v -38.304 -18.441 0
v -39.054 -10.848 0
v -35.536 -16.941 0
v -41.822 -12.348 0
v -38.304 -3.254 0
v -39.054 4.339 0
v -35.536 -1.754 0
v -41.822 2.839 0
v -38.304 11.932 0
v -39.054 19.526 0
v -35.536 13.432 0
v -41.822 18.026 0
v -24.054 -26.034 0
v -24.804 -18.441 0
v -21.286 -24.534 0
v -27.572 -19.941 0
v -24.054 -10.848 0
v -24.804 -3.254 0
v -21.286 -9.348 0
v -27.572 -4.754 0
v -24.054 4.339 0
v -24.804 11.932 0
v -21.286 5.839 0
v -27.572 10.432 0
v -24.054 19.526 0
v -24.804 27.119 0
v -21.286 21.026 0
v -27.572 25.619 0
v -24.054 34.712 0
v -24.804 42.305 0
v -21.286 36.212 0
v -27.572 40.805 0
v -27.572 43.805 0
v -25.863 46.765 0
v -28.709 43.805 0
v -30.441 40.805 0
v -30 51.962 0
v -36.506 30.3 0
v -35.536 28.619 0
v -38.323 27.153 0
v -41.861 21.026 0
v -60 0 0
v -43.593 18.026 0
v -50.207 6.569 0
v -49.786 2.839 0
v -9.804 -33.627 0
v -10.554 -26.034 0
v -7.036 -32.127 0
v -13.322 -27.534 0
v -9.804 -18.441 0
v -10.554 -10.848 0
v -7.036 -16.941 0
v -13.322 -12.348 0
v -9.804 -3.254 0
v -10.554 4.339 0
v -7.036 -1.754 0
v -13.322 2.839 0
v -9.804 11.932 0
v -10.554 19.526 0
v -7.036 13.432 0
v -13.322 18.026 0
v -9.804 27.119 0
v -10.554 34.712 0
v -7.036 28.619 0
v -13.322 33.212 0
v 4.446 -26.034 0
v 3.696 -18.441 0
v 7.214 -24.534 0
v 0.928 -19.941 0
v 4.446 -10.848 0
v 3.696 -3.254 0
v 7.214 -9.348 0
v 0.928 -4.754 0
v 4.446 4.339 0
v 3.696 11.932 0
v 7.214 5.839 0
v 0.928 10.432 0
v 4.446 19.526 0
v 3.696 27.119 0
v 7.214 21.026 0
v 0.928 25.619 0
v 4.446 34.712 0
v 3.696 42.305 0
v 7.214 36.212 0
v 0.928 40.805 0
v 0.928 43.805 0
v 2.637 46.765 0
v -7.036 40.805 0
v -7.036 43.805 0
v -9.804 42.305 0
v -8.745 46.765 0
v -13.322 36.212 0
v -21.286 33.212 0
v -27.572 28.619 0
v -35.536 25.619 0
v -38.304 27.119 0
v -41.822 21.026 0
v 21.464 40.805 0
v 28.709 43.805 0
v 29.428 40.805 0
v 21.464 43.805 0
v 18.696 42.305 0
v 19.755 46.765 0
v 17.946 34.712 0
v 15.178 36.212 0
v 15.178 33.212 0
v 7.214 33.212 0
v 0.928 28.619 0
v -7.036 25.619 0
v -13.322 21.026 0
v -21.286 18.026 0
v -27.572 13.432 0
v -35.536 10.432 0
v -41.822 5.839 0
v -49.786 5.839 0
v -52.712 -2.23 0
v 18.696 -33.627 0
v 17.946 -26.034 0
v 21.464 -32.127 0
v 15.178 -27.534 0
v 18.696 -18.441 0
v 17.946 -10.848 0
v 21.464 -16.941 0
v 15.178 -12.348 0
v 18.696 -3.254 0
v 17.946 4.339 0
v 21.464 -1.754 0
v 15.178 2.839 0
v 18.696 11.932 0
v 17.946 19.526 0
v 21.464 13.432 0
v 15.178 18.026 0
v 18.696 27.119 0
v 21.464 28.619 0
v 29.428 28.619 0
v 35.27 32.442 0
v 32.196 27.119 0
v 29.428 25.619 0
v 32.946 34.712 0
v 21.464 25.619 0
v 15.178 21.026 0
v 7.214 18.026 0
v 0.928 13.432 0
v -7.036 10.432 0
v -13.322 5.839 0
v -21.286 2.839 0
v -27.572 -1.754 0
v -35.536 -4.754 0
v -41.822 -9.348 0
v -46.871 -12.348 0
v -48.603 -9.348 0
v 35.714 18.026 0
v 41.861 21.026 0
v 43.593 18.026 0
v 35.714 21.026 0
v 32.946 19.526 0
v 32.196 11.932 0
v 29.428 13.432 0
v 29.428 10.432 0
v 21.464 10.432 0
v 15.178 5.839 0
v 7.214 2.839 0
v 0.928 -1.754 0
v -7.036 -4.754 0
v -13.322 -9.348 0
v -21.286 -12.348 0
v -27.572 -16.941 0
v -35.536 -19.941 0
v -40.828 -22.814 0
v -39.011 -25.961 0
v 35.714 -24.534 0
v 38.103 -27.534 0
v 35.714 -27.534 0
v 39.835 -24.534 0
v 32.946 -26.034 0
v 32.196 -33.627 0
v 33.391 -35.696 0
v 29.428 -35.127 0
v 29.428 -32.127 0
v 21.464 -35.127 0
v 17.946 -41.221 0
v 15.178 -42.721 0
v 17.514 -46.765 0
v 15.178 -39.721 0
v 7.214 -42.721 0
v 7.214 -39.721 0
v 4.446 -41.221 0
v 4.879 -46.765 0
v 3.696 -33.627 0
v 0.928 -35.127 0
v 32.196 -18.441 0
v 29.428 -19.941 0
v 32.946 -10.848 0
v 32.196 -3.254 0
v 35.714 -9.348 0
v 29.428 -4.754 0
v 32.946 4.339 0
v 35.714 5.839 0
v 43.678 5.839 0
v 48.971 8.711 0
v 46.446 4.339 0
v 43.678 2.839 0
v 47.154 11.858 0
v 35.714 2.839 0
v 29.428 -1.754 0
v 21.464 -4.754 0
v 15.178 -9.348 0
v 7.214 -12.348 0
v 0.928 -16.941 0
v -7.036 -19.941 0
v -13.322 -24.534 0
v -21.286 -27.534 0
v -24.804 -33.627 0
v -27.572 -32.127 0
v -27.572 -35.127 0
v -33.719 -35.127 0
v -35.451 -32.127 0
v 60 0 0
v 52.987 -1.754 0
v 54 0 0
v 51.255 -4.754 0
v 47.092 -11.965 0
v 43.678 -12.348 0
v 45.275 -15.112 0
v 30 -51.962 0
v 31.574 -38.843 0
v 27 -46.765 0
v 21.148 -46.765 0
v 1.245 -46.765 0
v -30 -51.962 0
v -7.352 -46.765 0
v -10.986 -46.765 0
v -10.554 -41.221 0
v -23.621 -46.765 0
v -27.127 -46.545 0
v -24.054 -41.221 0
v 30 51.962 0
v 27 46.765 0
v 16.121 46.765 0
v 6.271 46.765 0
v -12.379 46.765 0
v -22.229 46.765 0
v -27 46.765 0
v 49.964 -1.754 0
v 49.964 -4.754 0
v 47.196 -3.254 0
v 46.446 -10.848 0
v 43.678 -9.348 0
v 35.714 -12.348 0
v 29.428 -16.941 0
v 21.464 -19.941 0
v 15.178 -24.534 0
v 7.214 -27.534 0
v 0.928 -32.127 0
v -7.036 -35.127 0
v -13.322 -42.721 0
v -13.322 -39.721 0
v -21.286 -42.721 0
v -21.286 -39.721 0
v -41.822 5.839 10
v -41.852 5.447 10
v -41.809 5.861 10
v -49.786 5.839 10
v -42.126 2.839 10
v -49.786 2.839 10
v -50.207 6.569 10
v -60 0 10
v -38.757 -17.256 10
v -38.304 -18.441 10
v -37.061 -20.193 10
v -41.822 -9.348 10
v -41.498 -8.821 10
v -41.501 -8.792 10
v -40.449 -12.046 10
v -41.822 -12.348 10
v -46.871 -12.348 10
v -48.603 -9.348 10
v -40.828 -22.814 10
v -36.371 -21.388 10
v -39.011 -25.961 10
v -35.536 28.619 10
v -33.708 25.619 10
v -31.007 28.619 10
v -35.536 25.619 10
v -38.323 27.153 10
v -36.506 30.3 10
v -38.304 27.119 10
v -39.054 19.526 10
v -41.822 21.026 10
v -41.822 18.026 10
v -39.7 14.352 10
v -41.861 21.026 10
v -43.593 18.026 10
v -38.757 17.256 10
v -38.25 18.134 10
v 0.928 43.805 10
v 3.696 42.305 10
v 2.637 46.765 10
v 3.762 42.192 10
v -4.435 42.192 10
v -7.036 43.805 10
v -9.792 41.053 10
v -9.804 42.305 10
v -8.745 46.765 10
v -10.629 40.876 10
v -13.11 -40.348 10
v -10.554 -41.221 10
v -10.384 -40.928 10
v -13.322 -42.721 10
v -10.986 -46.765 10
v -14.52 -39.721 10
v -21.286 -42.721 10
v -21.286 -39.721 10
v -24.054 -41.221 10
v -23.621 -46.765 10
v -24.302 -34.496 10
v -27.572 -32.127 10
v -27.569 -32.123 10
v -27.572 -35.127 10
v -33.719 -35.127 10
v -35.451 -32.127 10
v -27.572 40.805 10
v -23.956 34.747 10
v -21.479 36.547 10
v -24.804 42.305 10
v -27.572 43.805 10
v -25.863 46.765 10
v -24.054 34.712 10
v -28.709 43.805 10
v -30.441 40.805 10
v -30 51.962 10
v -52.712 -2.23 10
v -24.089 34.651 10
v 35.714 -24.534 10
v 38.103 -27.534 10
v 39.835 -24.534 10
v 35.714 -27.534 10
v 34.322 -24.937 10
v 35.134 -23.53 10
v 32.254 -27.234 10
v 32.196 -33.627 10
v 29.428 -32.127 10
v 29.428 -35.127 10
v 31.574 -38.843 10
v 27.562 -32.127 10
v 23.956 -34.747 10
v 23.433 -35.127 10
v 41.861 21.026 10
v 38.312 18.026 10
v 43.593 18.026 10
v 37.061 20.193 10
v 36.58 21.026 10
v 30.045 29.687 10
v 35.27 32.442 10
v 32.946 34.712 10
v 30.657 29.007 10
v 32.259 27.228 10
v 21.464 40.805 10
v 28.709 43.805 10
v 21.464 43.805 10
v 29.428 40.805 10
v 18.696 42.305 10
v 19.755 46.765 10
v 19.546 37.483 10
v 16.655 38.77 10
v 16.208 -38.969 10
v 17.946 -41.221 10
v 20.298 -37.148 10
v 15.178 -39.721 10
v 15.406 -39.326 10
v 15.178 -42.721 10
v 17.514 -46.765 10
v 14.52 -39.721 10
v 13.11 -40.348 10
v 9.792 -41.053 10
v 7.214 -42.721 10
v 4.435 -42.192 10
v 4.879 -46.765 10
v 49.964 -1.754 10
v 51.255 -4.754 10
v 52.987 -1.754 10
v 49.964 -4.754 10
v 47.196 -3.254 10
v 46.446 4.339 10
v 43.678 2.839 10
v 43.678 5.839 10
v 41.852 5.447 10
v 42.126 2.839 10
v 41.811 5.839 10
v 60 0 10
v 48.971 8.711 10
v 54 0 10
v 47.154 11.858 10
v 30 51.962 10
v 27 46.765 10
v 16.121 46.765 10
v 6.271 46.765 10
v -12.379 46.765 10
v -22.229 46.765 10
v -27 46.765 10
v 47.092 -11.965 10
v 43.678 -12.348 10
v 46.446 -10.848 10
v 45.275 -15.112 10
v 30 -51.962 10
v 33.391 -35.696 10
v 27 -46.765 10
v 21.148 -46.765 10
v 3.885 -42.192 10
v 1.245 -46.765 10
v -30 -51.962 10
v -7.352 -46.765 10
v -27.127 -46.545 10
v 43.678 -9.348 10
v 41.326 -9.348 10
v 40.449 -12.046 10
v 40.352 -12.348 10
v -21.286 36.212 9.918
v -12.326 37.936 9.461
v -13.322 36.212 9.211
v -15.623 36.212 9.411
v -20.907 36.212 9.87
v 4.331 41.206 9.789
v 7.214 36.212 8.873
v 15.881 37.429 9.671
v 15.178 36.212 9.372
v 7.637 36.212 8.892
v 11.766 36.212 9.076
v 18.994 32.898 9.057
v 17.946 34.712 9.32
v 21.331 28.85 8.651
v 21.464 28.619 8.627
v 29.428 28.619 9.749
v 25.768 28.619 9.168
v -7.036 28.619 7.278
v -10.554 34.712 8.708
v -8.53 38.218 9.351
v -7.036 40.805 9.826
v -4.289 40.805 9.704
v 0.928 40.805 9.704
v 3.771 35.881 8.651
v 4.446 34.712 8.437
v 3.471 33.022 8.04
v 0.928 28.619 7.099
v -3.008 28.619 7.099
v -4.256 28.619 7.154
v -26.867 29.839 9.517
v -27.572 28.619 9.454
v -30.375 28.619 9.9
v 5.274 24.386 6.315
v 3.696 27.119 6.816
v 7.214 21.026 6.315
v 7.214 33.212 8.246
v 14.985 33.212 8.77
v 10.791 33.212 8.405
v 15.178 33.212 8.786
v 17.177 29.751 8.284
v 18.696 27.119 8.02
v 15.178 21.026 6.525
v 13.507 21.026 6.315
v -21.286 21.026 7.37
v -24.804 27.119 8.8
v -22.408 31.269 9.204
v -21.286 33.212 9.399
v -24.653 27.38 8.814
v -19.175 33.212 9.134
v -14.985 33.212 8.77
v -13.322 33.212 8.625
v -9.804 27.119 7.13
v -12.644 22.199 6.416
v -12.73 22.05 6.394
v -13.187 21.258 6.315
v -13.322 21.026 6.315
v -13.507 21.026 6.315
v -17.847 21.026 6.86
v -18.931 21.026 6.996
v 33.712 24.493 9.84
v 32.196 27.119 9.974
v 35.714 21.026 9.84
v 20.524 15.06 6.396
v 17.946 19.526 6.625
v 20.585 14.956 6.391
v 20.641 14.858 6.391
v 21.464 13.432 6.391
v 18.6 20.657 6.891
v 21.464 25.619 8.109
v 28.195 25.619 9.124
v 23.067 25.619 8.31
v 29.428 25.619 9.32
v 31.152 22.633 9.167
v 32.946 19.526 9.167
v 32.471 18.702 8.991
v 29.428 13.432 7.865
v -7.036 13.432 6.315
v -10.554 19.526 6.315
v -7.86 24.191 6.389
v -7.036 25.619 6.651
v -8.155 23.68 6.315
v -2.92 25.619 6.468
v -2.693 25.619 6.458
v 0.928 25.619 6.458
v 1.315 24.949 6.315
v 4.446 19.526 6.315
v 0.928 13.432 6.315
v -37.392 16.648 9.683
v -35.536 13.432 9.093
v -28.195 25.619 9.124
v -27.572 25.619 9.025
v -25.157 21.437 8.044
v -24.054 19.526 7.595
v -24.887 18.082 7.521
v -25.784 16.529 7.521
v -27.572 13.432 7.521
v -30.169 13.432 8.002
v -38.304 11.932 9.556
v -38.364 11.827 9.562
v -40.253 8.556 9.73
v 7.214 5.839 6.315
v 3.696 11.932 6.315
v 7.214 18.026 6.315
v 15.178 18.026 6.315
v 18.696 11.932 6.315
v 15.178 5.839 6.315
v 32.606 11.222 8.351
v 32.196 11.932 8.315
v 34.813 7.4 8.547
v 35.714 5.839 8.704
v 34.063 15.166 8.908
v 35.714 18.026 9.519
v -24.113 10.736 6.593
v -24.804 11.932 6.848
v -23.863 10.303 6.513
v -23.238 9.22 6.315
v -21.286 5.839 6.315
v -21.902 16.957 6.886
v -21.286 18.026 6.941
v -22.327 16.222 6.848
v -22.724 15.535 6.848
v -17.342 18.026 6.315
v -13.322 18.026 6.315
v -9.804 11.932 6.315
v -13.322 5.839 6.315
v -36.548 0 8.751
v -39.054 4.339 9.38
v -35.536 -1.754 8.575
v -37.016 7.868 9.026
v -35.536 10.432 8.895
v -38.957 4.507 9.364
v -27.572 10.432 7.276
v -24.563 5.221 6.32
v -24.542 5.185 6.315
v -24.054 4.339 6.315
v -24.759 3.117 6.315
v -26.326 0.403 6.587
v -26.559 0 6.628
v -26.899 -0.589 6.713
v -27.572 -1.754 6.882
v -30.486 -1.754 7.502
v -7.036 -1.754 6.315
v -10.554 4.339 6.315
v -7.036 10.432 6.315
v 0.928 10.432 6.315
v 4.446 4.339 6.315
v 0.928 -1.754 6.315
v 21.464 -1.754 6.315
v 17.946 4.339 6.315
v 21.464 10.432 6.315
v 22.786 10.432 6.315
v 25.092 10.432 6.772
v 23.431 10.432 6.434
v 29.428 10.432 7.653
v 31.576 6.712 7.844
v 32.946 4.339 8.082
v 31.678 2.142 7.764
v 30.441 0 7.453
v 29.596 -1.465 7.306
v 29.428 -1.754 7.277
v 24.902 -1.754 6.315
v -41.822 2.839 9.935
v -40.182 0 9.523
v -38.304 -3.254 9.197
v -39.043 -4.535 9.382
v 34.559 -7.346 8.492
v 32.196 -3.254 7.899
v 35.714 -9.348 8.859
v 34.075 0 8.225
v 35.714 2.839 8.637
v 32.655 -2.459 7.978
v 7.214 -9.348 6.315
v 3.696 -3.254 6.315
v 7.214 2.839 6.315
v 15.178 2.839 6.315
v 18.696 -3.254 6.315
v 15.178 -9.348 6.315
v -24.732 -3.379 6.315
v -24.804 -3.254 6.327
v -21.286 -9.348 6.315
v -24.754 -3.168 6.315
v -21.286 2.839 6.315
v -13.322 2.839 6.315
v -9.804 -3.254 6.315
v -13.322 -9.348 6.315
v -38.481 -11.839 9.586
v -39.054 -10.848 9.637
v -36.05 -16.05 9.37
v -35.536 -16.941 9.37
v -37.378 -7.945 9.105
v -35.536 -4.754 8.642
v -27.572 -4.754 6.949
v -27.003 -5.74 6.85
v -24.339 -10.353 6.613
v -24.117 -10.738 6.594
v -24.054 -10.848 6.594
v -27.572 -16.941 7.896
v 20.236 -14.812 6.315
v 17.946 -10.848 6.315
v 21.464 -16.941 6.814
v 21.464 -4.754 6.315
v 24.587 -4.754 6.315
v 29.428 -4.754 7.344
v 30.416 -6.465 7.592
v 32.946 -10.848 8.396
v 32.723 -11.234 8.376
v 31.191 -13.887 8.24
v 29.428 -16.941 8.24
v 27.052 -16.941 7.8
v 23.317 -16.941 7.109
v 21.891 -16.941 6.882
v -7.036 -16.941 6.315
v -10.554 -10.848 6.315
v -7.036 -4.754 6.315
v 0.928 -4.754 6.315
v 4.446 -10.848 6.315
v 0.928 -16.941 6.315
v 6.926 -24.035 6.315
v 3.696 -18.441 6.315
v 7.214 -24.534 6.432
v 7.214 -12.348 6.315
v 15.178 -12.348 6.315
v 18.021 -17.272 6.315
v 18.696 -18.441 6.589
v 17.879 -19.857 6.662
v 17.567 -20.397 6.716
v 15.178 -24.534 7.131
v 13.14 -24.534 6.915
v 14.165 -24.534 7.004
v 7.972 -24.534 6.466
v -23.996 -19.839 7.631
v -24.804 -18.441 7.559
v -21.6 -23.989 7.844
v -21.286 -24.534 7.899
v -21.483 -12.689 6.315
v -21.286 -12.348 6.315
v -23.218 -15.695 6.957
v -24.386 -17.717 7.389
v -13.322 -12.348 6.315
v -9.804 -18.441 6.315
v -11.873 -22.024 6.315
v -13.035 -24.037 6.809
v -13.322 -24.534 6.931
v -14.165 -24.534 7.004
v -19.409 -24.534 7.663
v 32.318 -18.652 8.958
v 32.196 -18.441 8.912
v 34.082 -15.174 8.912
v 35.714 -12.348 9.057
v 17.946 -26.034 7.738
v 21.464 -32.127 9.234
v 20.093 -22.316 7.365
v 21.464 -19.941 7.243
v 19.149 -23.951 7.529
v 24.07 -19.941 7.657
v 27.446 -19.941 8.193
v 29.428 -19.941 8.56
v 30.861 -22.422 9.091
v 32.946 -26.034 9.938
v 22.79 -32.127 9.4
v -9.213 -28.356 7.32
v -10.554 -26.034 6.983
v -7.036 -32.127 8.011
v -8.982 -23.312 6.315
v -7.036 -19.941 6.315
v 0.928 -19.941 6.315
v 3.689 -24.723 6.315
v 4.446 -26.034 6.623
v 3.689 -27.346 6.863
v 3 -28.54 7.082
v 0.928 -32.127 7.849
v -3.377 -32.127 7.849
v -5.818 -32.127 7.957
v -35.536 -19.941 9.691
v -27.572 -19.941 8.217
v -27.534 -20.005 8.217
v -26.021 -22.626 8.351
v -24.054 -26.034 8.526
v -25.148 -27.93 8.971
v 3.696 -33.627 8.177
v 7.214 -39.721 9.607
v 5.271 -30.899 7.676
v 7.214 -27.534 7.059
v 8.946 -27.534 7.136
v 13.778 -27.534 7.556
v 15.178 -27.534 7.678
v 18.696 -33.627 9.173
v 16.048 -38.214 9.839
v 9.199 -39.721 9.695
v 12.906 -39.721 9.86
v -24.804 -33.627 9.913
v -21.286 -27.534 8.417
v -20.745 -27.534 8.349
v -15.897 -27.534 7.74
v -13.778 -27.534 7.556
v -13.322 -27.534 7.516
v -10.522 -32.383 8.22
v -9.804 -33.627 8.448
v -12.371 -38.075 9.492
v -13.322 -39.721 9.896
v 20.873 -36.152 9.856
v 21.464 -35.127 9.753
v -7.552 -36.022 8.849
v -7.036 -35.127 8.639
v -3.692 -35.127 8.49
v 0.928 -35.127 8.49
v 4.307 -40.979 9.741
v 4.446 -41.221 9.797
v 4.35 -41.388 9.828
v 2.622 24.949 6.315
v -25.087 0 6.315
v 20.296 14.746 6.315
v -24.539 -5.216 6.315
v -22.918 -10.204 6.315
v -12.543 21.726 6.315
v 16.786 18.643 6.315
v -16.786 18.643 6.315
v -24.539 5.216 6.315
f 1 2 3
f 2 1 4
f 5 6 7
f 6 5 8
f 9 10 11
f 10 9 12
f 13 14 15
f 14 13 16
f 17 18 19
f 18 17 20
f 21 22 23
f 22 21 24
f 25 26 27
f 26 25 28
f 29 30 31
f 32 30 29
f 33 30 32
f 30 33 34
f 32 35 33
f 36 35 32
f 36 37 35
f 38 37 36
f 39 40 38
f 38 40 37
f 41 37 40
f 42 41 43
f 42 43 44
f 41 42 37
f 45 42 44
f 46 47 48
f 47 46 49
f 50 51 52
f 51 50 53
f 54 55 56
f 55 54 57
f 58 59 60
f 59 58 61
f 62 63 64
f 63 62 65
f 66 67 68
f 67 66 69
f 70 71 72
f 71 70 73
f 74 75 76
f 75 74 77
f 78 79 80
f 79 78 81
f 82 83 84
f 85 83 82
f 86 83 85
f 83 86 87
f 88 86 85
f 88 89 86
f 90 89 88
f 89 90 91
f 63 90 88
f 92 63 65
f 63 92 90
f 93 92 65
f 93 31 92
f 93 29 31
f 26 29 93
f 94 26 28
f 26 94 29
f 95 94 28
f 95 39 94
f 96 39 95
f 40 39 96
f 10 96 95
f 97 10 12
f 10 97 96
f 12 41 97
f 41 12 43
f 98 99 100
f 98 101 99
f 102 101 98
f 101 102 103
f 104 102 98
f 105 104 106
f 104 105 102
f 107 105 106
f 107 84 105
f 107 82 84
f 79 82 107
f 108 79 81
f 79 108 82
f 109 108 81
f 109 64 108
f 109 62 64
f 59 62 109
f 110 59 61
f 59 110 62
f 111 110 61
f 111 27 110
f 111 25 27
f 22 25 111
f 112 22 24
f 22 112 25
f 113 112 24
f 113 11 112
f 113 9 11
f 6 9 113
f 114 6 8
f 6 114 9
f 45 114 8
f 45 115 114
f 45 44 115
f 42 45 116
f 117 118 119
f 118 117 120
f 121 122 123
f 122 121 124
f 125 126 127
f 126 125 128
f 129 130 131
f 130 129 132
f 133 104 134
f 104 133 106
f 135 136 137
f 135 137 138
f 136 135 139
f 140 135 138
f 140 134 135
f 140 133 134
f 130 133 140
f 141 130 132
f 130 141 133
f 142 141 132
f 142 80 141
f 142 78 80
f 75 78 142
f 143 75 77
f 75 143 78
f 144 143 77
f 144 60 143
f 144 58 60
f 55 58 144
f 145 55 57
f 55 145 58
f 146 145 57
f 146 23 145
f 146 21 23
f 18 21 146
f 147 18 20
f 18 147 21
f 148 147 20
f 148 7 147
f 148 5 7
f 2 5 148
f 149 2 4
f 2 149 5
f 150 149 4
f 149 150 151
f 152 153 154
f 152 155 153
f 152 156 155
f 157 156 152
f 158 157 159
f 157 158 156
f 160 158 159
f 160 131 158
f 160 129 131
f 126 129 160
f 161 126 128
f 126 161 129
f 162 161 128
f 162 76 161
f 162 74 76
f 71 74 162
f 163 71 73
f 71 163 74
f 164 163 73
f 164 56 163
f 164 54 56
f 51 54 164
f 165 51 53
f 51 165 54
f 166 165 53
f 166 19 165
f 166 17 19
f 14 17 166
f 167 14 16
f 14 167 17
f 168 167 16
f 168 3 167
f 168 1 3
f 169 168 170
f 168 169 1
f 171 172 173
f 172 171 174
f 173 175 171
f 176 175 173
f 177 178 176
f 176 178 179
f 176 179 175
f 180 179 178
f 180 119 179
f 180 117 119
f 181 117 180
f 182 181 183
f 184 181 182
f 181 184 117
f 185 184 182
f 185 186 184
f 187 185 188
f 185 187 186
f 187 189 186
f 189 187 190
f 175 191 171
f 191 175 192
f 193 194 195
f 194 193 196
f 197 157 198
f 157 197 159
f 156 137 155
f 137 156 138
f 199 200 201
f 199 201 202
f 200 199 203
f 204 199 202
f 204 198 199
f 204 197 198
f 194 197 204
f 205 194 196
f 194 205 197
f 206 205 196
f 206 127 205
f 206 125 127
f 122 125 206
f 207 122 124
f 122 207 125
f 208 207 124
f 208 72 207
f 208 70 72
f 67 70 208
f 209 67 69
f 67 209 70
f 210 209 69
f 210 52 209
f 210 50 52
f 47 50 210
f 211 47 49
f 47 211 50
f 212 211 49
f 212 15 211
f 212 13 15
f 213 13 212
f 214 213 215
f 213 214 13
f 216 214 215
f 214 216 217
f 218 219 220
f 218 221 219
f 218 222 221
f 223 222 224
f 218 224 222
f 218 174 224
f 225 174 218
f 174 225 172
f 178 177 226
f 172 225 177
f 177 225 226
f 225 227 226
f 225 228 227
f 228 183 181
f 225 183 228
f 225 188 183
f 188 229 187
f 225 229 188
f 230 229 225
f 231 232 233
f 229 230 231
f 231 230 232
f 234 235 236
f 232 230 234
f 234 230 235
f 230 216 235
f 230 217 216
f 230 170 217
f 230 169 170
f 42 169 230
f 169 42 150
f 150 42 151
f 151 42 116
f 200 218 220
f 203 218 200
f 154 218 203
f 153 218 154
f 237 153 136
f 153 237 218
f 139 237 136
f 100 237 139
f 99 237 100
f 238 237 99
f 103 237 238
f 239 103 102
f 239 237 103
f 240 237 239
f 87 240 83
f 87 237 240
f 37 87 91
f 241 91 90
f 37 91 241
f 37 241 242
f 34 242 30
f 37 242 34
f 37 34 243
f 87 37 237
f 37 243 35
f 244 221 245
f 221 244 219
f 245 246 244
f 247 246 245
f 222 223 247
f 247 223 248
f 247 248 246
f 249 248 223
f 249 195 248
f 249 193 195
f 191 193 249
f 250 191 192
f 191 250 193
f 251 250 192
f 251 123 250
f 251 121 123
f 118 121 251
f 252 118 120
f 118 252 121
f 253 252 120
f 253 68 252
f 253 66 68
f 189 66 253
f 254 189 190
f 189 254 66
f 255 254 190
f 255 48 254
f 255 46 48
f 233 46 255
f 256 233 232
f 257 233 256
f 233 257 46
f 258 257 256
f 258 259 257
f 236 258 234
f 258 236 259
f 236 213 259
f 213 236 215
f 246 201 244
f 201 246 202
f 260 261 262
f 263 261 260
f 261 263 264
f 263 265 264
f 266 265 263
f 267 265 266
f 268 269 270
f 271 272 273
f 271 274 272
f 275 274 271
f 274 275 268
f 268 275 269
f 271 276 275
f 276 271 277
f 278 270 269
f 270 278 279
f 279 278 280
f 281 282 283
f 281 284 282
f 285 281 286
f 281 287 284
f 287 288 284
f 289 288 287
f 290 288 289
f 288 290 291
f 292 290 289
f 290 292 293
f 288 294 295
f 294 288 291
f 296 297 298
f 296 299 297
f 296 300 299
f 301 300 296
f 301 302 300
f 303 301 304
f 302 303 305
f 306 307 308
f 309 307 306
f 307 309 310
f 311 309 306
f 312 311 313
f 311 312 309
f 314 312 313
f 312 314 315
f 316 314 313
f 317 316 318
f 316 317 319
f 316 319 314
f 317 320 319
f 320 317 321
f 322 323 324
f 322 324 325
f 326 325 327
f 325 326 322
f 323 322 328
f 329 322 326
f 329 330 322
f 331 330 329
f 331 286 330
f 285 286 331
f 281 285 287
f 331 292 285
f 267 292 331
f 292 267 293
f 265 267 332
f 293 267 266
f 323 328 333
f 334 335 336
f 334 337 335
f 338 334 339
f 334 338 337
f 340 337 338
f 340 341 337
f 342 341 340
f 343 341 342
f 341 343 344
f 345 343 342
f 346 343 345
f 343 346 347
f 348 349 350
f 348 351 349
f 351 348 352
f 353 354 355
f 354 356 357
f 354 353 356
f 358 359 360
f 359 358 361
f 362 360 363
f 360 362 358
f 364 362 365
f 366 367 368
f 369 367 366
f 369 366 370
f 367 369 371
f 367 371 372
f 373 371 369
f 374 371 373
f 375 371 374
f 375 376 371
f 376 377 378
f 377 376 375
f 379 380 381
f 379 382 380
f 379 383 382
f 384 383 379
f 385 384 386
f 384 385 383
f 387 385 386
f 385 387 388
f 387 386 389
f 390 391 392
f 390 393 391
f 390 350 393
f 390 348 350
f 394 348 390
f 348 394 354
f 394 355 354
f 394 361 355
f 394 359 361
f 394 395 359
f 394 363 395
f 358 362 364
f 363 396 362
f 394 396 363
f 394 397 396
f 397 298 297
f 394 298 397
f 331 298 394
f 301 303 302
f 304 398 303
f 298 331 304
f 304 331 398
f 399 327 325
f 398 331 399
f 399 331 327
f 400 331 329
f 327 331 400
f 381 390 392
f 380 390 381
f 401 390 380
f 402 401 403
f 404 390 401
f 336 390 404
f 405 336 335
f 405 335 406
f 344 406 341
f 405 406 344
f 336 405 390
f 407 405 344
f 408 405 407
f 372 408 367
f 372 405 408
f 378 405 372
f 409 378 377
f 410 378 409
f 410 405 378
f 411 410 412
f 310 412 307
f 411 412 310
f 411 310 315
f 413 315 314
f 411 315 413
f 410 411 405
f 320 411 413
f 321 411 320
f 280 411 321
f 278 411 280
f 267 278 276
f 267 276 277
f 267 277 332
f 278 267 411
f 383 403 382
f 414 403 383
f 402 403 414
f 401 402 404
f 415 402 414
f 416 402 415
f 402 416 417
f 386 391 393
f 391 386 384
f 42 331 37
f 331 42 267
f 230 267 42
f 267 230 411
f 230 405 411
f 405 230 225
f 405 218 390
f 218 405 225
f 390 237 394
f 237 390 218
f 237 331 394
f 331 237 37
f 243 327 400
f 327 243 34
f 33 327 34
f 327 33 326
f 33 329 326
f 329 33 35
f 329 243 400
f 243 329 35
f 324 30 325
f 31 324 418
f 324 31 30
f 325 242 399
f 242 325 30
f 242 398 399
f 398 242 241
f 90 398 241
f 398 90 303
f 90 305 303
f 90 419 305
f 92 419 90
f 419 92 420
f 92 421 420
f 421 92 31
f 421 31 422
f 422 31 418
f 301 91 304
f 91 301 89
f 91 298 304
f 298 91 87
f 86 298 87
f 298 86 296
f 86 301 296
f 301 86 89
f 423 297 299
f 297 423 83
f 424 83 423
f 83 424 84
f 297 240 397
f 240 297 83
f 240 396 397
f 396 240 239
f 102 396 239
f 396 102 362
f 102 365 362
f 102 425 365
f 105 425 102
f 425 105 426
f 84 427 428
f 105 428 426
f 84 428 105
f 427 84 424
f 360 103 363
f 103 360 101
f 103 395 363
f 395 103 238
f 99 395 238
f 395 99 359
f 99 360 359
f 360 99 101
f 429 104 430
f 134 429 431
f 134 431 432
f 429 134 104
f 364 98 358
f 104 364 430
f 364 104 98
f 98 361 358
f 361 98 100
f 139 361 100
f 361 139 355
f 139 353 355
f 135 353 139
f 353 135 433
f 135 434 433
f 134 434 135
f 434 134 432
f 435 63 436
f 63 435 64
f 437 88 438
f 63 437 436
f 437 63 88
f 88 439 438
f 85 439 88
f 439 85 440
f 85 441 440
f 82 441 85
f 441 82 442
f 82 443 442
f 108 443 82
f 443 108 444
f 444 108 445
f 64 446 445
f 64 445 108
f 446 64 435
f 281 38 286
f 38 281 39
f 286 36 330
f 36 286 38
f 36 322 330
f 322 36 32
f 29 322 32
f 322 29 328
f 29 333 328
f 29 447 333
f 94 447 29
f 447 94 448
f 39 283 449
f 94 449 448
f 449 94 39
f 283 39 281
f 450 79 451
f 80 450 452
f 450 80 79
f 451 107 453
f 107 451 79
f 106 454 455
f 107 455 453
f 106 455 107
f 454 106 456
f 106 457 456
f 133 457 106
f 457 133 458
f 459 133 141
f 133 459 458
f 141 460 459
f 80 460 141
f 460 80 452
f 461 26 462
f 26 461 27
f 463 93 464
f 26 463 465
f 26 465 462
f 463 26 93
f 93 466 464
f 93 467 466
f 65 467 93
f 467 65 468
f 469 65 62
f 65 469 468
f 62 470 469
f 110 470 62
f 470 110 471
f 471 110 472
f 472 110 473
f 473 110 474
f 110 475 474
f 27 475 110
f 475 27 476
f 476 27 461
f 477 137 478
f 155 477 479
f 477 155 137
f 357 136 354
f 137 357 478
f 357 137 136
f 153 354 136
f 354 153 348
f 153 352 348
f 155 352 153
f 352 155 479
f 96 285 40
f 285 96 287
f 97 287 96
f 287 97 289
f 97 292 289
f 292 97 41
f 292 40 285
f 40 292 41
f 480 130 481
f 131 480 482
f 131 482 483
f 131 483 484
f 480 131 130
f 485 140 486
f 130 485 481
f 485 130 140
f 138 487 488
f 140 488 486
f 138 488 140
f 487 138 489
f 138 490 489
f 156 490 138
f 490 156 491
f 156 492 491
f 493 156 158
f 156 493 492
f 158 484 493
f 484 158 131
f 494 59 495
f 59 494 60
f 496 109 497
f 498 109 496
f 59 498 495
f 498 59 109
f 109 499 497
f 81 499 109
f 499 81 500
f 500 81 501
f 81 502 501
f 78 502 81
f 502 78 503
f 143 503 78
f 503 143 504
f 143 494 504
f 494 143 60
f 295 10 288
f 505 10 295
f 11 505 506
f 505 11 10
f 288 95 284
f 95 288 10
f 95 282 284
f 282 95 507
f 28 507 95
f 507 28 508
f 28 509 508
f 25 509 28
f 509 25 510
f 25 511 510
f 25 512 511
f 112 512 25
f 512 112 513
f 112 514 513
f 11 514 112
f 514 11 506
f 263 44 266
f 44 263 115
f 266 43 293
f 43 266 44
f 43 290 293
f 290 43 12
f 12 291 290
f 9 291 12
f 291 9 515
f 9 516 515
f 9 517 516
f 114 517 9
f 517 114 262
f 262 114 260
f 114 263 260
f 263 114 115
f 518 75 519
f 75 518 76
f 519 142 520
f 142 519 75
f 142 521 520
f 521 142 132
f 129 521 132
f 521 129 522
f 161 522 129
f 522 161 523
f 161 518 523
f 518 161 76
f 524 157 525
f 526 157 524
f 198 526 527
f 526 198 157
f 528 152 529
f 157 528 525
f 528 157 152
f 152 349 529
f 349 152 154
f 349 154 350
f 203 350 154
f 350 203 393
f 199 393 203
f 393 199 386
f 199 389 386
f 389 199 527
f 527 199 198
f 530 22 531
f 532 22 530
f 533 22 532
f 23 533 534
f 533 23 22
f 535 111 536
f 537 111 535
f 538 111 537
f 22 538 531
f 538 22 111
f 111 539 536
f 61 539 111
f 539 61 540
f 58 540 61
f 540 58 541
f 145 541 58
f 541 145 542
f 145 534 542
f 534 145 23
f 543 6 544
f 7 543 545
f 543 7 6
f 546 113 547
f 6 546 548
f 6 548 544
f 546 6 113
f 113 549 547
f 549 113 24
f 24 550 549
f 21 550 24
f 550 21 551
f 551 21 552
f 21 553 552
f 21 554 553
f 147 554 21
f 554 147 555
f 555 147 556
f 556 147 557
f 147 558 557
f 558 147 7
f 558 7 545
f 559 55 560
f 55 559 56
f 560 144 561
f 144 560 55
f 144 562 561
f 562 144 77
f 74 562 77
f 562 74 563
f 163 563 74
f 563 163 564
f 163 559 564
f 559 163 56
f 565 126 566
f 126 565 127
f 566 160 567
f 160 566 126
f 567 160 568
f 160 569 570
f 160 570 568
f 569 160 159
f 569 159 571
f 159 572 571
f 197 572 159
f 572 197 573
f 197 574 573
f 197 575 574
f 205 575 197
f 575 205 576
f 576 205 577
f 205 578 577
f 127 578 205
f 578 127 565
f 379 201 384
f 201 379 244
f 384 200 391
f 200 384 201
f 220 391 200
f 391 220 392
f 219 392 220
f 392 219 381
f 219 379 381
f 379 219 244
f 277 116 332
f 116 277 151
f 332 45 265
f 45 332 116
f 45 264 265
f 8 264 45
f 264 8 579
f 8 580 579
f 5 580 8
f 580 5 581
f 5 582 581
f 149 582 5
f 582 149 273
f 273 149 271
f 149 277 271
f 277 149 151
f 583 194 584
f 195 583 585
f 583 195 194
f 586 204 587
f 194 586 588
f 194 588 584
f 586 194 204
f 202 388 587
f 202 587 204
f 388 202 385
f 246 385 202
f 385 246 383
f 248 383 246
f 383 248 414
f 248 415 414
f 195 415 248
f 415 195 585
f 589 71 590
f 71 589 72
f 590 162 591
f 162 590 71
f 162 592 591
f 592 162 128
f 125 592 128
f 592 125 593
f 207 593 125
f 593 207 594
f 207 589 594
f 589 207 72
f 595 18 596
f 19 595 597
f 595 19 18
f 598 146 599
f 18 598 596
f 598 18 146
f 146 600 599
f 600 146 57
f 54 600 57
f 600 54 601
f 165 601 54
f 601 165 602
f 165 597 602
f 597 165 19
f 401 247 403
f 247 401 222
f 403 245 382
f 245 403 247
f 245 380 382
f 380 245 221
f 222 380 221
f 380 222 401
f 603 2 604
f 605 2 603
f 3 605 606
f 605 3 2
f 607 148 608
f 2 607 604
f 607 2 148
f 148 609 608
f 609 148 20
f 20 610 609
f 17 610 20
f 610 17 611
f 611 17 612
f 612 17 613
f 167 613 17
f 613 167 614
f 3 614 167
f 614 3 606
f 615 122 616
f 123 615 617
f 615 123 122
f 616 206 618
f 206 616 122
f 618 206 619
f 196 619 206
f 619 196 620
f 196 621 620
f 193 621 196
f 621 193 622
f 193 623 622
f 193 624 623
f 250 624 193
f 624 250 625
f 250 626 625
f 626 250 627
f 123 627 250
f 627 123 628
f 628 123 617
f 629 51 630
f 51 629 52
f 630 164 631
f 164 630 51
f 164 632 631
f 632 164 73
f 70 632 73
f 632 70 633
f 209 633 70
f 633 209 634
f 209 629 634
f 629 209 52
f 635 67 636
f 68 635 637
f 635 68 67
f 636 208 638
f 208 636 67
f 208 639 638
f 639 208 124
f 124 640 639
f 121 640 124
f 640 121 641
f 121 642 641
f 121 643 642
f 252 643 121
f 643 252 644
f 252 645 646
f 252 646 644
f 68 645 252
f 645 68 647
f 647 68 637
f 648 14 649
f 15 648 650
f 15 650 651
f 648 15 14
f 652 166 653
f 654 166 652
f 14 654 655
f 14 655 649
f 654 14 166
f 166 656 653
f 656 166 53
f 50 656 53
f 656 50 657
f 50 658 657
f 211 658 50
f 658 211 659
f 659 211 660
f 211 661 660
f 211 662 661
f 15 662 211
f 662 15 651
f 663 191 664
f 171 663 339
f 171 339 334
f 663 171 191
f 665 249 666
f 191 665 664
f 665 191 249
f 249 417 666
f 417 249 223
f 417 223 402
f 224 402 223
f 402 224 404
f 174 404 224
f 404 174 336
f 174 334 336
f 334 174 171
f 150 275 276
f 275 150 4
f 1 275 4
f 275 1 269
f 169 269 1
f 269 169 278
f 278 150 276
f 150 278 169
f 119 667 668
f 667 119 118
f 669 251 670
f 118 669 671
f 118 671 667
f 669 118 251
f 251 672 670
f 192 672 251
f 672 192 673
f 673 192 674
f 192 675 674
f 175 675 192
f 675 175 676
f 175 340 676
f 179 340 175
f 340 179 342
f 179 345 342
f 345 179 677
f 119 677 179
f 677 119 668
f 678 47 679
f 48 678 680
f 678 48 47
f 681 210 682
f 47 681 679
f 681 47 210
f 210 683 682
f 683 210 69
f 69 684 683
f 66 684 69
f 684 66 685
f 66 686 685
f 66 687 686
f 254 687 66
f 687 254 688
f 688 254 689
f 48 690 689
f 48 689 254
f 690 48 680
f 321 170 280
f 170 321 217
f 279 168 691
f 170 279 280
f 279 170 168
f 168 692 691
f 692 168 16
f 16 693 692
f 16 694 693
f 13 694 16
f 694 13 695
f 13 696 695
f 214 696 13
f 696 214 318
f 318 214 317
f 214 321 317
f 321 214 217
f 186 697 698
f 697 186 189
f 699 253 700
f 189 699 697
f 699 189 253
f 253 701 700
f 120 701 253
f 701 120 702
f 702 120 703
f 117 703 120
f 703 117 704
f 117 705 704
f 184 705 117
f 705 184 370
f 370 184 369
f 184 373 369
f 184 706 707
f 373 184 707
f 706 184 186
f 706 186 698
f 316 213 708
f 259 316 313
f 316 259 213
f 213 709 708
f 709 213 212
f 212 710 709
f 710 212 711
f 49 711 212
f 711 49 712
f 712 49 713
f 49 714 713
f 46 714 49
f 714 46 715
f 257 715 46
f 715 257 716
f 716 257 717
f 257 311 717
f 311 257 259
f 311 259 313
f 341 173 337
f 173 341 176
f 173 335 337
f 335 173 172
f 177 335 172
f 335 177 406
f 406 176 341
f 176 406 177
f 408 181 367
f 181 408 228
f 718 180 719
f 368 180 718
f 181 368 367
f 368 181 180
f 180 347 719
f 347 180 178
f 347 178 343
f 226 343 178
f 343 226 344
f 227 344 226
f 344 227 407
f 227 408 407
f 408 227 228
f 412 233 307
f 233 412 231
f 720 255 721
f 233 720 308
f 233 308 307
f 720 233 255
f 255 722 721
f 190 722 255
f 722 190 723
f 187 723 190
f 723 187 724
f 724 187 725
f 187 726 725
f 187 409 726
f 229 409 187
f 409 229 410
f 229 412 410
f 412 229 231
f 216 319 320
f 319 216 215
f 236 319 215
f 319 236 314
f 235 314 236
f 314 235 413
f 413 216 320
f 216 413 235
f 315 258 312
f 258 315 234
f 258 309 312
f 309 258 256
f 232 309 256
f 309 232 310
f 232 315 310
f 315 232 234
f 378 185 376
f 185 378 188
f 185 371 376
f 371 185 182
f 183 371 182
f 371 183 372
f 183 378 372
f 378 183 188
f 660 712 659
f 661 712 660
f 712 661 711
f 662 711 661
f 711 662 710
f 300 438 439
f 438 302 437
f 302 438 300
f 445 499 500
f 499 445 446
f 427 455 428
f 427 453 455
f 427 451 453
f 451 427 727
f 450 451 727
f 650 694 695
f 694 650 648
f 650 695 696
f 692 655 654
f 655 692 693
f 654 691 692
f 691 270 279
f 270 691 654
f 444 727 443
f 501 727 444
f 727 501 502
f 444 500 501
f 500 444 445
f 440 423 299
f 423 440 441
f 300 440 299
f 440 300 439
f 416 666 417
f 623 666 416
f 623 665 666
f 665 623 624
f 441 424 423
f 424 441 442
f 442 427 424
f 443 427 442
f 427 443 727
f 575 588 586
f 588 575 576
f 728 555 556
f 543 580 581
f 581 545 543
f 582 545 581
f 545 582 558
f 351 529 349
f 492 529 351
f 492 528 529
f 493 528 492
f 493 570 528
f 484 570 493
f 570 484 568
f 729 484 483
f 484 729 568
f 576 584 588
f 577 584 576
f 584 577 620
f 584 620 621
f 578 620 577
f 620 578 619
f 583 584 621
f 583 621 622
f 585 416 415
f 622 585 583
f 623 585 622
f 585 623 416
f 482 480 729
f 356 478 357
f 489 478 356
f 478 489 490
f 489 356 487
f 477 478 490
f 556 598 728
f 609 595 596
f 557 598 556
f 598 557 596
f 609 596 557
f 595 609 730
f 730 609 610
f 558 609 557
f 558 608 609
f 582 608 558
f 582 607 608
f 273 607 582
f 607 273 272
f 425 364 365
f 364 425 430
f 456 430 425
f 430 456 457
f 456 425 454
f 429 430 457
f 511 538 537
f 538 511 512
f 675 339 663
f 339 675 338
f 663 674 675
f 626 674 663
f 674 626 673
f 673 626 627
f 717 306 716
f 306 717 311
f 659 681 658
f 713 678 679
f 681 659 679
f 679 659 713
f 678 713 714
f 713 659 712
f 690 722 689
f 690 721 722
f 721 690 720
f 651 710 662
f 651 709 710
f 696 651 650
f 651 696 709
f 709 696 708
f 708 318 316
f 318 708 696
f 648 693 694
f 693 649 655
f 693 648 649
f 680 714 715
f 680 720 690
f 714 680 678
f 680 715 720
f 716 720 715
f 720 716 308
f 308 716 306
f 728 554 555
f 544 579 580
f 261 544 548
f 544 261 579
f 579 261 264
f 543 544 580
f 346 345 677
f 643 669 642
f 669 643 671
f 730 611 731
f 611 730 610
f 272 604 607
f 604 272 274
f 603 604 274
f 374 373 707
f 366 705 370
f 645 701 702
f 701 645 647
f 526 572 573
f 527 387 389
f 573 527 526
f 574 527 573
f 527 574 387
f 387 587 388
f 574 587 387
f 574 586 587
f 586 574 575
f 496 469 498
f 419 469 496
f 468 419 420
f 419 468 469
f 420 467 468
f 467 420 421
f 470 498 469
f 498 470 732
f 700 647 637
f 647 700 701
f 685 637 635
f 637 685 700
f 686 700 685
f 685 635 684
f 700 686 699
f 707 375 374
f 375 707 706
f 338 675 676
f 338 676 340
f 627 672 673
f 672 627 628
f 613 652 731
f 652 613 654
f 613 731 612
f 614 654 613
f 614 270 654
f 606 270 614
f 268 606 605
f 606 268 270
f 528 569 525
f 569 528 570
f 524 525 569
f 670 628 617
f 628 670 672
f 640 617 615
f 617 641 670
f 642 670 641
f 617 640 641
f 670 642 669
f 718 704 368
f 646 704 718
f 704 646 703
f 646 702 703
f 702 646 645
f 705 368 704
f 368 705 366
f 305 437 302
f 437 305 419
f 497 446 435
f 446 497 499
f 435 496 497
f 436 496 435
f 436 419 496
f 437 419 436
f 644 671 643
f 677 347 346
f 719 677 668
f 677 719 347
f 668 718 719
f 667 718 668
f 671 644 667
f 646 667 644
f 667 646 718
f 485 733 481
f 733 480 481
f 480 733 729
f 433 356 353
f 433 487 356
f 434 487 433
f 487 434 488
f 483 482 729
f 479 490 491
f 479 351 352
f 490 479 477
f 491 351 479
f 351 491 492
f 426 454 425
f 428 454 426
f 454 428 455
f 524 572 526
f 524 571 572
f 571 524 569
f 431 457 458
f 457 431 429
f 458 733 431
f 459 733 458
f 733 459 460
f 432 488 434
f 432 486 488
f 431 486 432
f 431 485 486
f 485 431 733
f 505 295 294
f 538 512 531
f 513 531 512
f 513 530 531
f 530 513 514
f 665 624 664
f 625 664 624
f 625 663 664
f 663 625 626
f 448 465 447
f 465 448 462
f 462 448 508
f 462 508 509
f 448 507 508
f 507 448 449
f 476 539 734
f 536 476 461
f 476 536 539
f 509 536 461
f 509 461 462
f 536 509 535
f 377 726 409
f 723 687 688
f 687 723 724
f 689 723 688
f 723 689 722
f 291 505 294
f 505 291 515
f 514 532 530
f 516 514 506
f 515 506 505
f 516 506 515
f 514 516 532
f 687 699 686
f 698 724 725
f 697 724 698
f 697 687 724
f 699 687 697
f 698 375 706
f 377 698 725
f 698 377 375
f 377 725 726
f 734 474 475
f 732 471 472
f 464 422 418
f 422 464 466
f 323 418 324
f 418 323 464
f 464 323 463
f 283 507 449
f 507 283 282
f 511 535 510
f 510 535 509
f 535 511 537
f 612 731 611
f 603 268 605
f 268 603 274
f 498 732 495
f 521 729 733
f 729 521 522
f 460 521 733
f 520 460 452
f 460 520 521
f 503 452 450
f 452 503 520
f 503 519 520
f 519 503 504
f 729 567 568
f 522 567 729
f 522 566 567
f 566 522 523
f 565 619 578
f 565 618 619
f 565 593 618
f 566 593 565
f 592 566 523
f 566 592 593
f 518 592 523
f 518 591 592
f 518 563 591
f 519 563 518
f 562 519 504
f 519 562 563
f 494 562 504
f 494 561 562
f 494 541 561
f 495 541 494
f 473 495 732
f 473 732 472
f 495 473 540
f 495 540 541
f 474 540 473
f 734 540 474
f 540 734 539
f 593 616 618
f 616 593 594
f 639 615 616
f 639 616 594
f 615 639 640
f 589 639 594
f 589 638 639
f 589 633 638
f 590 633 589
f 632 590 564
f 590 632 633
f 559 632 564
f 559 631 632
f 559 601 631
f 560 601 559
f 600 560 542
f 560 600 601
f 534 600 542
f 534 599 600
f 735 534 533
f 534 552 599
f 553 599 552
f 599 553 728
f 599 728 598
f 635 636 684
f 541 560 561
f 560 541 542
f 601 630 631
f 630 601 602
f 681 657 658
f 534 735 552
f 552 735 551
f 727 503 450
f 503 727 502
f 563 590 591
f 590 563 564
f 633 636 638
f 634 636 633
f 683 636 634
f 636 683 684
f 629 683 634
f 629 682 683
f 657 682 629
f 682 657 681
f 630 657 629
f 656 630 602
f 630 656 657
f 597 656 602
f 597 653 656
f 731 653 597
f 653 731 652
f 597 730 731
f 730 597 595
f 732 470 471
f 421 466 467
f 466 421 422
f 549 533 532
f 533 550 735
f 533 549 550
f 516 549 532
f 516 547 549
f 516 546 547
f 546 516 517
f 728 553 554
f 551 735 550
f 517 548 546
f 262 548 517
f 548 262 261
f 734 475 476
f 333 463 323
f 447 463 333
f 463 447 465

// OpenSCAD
module hexagone(apothemLength) {
    angle = 360 / 6;
    
    coords = [
        for (i = [0:5]) [ apothemLength * cos(i * 60), apothemLength * sin(i * 60) ]
    ];
    
    polygon(coords);
}

module honeycomb_cell(apothemLength, thickness) {
    difference() {
        hexagone(apothemLength);

        hexagone(apothemLength - thickness);
    }
}

module honeycomb(rowCount, columnCount, cellApothemLength, thickness, center = true) {
    offsetX = cellApothemLength + cellApothemLength * 0.5 - thickness * 0.5;
    offsetY = cos(30) * cellApothemLength - thickness * 0.5;

    centerX = -rowCount * 0.5 * offsetX + offsetX * 0.5;
    centerY = -columnCount * 0.5 * offsetY * 2 + offsetY;

    union() {
        translate([centerX, centerY,  0]) {
            for (i = [0:rowCount-1]) {
                for (j = [0:columnCount-1]) {
                    if ((i % 2) == 0) {
                        translate([i * offsetX, j * offsetY * 2, 0]) {
                            honeycomb_cell(cellApothemLength, thickness);
                        }
                    } else {
                        translate([i * offsetX, j * offsetY * 2 + offsetY, 0]) {
                            honeycomb_cell(cellApothemLength, thickness);
                        }
                    }
                }
            }
        }
    }
}

module soap_grid(size, depth, fillPercent) {
    length = size * 0.5;
    cellApothemLength = length * fillPercent;
    rowCount = size / cellApothemLength;
    sphereRadius = size + size;
    sphereZ = sphereRadius + depth * 0.5;

    difference() {
        linear_extrude(depth) {
            union() {
                intersection() {
                    hexagone(length);
                    honeycomb(rowCount, rowCount, cellApothemLength, 3);
                }

                honeycomb_cell(length, 6);
            }
        }

        translate([ 0, 0, sphereZ]) {
            sphere(sphereRadius);
        }
    }
}

module soap_box(size, depth, depthGrid, thickness) {
    length = size * 0.5;

    union() {
        linear_extrude(thickness) {
            hexagone(length + 1 + thickness, thickness);
        }

        linear_extrude(depth) {
            honeycomb_cell(length + 1 + thickness, thickness);
        }

        linear_extrude(depth - depthGrid) {
            honeycomb_cell(length + 2, thickness);
        }
    }
}

//soap_box(120, 25, 10, 6);
//translate([0, 0, 50]) {
    soap_grid(120, 10, 0.175);
//}
